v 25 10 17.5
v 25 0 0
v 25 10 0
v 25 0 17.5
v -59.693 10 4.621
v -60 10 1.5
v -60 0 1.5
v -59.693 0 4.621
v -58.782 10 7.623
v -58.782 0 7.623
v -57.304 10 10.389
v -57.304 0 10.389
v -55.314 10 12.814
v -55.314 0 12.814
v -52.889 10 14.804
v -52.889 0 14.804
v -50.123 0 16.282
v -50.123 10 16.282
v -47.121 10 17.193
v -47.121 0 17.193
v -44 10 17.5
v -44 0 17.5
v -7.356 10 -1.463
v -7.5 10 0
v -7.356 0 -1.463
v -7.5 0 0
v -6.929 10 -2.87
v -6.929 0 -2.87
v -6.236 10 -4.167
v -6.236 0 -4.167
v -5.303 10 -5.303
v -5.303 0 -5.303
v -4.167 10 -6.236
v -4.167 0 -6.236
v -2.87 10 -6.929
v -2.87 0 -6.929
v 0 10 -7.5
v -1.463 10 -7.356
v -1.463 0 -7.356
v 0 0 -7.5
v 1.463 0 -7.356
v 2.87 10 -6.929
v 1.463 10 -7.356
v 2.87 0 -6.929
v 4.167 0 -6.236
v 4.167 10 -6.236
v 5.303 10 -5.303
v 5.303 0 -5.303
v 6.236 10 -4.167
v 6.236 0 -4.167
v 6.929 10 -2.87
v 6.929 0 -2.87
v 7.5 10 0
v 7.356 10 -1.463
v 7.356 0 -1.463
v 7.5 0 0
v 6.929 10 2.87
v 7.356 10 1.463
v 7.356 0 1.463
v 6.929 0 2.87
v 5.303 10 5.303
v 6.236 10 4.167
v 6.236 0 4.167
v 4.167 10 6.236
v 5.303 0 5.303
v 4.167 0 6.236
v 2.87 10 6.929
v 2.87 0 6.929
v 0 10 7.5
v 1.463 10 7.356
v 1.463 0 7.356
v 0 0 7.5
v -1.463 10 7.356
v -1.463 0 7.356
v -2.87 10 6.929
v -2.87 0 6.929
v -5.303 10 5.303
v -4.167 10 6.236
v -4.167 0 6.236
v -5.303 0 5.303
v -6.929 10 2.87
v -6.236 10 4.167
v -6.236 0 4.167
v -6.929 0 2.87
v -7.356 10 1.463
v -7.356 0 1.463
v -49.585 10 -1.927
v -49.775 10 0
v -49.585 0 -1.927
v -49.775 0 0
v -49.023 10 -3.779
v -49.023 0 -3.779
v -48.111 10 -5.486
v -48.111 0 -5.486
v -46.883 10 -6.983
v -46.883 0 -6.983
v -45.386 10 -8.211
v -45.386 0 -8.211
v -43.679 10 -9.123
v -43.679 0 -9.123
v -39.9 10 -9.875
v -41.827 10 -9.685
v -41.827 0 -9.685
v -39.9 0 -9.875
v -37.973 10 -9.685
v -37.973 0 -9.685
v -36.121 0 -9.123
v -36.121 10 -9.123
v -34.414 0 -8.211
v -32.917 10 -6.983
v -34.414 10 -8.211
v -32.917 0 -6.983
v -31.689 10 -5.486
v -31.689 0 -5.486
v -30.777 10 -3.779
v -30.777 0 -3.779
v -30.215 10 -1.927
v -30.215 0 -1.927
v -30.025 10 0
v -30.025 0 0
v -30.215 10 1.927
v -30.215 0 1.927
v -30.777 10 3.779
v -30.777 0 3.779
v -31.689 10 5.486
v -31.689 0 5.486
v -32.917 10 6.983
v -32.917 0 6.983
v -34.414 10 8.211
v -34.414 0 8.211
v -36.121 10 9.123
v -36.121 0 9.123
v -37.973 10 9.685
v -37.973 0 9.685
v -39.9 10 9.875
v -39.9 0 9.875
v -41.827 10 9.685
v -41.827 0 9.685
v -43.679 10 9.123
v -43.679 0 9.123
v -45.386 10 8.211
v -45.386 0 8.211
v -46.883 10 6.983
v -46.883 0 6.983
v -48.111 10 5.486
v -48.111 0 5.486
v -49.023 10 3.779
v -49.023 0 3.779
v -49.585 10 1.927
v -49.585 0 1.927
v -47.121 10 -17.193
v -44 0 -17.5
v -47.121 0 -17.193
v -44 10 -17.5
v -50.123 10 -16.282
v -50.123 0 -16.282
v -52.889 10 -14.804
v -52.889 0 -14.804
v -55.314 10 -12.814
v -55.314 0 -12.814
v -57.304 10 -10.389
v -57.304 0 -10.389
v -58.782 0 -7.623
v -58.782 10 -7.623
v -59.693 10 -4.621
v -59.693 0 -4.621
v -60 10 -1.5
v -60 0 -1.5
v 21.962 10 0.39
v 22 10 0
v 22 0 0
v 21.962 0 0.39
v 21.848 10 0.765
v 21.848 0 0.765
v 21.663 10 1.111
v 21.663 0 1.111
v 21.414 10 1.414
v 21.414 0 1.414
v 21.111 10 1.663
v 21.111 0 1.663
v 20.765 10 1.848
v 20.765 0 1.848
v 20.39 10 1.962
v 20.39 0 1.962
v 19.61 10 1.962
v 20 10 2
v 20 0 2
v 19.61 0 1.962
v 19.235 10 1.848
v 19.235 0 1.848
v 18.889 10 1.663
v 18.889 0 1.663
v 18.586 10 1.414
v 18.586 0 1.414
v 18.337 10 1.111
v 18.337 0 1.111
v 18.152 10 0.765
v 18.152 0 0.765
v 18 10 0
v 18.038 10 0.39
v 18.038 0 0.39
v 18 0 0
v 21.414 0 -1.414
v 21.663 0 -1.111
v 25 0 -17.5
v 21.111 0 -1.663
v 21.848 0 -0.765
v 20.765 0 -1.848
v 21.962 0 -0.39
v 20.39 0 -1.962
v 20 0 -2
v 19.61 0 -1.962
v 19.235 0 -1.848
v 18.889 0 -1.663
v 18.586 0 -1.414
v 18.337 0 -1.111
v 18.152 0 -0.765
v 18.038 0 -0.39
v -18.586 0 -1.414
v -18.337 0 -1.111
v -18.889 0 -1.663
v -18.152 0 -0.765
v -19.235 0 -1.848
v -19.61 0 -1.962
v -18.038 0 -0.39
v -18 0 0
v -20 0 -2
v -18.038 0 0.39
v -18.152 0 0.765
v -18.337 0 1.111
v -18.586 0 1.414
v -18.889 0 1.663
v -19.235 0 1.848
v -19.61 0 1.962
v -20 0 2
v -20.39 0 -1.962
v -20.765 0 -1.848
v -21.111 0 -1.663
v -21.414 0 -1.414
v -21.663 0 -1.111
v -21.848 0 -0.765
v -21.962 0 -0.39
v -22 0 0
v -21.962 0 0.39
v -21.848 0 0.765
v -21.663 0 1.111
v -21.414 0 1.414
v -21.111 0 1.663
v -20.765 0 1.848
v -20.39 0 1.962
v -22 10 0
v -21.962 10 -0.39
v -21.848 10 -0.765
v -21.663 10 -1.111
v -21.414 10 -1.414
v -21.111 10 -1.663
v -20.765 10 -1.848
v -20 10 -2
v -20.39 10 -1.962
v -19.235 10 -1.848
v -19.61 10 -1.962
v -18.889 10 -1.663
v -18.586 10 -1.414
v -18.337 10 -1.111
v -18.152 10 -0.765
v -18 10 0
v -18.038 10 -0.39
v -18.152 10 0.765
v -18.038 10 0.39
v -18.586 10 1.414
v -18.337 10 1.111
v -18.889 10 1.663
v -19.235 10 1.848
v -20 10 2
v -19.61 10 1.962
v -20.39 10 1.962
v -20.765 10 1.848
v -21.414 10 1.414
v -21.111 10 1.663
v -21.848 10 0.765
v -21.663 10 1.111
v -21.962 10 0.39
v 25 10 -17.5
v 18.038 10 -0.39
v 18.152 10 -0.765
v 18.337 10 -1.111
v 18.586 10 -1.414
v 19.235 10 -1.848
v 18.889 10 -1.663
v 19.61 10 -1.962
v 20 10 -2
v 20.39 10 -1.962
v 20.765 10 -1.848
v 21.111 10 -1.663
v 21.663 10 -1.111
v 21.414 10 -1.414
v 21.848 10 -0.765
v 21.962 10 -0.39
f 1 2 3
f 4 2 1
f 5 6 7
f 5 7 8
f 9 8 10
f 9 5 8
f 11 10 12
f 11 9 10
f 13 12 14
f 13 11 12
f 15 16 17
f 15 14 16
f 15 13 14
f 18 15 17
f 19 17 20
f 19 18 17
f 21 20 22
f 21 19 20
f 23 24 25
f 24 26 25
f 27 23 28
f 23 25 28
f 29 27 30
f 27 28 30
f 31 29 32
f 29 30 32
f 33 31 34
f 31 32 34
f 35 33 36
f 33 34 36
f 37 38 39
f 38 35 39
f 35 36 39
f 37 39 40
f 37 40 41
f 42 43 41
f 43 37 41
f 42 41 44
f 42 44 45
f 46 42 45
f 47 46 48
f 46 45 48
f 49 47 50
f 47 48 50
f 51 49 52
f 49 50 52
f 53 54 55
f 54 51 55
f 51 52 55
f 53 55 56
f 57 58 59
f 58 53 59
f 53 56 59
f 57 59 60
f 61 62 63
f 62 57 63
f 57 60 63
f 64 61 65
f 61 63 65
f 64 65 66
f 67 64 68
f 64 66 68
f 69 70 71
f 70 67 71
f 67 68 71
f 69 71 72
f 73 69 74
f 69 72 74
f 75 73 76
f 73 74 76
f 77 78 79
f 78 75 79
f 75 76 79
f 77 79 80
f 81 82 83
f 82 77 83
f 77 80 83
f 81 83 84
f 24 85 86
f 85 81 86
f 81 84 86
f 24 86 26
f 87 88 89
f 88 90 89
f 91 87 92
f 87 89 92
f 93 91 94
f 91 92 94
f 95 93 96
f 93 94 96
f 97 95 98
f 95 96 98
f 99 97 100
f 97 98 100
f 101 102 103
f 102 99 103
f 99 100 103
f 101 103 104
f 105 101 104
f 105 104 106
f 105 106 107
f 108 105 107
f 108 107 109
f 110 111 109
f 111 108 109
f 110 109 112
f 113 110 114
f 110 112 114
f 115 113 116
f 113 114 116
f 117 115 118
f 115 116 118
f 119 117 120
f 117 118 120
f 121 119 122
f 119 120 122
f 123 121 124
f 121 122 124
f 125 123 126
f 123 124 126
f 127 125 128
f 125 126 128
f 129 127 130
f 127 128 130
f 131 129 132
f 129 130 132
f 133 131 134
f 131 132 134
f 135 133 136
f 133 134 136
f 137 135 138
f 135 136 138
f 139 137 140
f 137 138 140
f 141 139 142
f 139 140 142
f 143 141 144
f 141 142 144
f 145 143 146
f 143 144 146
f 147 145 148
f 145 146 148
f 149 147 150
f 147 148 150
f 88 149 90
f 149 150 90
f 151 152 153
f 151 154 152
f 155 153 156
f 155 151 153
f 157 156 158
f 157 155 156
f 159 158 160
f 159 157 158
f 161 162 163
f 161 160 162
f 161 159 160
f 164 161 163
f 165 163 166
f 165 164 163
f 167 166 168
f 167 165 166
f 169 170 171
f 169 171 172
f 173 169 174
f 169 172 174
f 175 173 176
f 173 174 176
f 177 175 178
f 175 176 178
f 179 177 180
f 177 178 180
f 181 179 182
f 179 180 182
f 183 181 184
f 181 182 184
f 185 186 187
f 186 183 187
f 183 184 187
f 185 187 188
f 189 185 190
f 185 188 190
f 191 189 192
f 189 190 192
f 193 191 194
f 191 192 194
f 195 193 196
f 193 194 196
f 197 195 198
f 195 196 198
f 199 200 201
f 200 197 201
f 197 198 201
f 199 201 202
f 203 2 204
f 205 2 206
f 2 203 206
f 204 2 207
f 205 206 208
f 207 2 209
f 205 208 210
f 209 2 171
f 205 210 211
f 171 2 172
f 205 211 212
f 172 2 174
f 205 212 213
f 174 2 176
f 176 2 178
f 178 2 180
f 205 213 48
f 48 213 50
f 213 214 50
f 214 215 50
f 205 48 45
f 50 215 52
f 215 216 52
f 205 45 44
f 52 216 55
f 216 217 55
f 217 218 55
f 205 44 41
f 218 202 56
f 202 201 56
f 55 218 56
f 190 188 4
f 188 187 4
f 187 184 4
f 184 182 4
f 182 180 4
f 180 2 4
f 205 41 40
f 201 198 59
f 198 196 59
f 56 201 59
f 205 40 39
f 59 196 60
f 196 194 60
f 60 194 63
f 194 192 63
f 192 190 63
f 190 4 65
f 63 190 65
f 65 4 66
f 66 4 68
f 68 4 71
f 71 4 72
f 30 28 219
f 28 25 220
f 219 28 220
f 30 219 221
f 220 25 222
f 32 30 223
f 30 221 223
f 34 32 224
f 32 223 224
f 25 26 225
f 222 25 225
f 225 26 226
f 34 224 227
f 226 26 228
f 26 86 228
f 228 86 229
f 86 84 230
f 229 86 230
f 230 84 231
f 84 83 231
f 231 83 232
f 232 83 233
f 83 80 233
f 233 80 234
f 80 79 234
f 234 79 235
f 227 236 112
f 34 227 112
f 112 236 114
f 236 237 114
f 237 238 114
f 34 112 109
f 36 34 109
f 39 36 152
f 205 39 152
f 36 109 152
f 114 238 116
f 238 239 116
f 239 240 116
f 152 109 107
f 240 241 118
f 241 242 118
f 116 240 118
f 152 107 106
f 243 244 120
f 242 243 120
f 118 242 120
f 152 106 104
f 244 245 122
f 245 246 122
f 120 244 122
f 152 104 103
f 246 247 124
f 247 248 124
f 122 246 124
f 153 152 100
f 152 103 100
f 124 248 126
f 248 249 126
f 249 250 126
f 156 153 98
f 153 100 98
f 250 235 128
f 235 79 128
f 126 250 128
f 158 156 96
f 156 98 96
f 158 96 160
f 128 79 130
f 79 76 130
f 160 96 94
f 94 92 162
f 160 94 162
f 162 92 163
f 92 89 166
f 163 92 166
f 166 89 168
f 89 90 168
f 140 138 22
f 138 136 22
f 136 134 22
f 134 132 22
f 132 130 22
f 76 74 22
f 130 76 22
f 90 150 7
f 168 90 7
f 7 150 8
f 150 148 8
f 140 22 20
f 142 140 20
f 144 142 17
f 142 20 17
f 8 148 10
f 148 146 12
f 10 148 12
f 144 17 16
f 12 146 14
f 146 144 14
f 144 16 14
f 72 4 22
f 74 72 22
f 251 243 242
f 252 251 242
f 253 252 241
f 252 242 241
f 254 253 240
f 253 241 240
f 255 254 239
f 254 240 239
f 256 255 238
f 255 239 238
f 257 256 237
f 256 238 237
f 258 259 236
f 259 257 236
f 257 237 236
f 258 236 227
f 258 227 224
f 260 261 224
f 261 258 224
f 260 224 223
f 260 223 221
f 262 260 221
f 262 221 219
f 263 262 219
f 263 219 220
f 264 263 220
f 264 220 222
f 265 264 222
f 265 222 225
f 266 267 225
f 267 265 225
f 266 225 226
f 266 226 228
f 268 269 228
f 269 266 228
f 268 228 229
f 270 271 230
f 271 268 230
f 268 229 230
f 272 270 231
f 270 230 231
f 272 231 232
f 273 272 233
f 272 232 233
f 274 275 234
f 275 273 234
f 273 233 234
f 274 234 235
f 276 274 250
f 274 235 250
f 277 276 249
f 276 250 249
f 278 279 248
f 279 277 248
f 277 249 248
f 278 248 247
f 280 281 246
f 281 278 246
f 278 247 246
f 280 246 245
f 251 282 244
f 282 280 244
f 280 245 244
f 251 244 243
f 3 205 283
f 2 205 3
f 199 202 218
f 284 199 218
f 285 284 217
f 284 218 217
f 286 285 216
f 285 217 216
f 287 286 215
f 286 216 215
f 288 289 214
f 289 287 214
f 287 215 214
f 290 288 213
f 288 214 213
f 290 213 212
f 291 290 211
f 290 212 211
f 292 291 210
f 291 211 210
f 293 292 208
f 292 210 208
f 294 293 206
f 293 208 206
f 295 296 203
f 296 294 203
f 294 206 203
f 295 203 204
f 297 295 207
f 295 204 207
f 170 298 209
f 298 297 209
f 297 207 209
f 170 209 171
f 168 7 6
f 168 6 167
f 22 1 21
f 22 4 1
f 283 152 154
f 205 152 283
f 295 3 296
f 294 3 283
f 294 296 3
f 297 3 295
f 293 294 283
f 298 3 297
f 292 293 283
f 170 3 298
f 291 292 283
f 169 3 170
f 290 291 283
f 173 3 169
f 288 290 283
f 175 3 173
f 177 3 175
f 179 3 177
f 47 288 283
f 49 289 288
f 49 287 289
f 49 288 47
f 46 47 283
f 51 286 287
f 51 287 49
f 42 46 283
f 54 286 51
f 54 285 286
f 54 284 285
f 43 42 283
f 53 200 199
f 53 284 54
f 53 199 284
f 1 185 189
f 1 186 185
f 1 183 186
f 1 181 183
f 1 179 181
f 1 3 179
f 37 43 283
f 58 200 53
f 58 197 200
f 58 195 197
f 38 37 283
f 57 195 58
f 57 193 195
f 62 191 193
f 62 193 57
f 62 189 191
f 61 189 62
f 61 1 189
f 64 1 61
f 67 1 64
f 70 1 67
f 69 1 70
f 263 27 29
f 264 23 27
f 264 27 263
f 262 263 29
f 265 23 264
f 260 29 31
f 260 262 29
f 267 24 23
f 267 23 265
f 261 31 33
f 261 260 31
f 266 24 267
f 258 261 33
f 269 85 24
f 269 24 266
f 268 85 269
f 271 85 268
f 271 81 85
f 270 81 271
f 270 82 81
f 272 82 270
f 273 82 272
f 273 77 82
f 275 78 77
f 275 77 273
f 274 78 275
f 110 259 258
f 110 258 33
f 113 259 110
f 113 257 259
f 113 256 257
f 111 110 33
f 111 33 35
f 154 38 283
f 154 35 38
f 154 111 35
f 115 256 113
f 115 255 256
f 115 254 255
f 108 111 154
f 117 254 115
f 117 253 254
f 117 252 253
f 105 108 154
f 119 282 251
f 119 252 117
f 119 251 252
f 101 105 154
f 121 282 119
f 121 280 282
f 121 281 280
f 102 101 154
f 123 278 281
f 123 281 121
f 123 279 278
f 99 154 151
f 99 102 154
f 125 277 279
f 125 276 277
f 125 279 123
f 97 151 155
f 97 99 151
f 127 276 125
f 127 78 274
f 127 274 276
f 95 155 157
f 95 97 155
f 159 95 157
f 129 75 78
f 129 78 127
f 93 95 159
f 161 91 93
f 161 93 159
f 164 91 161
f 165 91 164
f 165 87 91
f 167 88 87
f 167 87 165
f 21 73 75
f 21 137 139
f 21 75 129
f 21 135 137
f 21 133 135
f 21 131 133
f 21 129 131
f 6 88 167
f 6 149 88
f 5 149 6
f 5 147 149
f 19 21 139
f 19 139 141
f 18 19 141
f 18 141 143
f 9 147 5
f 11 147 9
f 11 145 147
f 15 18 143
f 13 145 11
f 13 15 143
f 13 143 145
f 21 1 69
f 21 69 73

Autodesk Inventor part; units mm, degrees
ref_plane "YZ Plane" through (0, 0, 0) normal (1, 0, 0) x (0, 1, 0)
ref_plane "XZ Plane" through (0, 0, 0) normal (0, 1, 0) x (-1, 0, 0)
ref_plane "XY Plane" through (0, 0, 0) normal (0, 0, 1) x (1, 0, 0)
sketch "Sketch1" plane through (0, 0, 0) normal (0, 1, 0) x (-1, 0, 0)
  circle A0 centre (0, 0) radius 4
  circle A1 centre (-20, 0) radius 2
  circle A2 centre (20, 0) radius 2
  circle A3 centre (0, 0) radius 7.5
  line L0 (0, 0) -> (20, 0) construction
  circle A4 centre (0, 0) radius 3.9303 construction
  line L1 (0, 0) -> (39.9, 0) construction
  circle A5 centre (39.9, 0) radius 9.875
  line L2 (-20, 0) -> (-25, 0)
  line L3 (-25, 0) -> (-25, 17.5)
  line L4 (-25, 17.5) -> (60, 17.5)
  line L5 (60, 17.5) -> (60, -17.5)
  line L6 (60, -17.5) -> (-25, -17.5)
  line L7 (-25, -17.5) -> (-25, 17.5)
  dimension "d0" = 8
  dimension "d1" = 39.9
  dimension "d2" = 19.75
  dimension "d3" = 5
  dimension "d4" = 17.5
  dimension "d5" = 85
  dimension "d6" = 35
extrude "Extrusion1" add sketch "Sketch1" along normal blind 10 contours L3 L4 L5 L6 L7
fillet "Fillet1" radius 16 2 edges at (-60, 5, -17.5) (-60, 5, 17.5)
properties part number "Bear_fix"
